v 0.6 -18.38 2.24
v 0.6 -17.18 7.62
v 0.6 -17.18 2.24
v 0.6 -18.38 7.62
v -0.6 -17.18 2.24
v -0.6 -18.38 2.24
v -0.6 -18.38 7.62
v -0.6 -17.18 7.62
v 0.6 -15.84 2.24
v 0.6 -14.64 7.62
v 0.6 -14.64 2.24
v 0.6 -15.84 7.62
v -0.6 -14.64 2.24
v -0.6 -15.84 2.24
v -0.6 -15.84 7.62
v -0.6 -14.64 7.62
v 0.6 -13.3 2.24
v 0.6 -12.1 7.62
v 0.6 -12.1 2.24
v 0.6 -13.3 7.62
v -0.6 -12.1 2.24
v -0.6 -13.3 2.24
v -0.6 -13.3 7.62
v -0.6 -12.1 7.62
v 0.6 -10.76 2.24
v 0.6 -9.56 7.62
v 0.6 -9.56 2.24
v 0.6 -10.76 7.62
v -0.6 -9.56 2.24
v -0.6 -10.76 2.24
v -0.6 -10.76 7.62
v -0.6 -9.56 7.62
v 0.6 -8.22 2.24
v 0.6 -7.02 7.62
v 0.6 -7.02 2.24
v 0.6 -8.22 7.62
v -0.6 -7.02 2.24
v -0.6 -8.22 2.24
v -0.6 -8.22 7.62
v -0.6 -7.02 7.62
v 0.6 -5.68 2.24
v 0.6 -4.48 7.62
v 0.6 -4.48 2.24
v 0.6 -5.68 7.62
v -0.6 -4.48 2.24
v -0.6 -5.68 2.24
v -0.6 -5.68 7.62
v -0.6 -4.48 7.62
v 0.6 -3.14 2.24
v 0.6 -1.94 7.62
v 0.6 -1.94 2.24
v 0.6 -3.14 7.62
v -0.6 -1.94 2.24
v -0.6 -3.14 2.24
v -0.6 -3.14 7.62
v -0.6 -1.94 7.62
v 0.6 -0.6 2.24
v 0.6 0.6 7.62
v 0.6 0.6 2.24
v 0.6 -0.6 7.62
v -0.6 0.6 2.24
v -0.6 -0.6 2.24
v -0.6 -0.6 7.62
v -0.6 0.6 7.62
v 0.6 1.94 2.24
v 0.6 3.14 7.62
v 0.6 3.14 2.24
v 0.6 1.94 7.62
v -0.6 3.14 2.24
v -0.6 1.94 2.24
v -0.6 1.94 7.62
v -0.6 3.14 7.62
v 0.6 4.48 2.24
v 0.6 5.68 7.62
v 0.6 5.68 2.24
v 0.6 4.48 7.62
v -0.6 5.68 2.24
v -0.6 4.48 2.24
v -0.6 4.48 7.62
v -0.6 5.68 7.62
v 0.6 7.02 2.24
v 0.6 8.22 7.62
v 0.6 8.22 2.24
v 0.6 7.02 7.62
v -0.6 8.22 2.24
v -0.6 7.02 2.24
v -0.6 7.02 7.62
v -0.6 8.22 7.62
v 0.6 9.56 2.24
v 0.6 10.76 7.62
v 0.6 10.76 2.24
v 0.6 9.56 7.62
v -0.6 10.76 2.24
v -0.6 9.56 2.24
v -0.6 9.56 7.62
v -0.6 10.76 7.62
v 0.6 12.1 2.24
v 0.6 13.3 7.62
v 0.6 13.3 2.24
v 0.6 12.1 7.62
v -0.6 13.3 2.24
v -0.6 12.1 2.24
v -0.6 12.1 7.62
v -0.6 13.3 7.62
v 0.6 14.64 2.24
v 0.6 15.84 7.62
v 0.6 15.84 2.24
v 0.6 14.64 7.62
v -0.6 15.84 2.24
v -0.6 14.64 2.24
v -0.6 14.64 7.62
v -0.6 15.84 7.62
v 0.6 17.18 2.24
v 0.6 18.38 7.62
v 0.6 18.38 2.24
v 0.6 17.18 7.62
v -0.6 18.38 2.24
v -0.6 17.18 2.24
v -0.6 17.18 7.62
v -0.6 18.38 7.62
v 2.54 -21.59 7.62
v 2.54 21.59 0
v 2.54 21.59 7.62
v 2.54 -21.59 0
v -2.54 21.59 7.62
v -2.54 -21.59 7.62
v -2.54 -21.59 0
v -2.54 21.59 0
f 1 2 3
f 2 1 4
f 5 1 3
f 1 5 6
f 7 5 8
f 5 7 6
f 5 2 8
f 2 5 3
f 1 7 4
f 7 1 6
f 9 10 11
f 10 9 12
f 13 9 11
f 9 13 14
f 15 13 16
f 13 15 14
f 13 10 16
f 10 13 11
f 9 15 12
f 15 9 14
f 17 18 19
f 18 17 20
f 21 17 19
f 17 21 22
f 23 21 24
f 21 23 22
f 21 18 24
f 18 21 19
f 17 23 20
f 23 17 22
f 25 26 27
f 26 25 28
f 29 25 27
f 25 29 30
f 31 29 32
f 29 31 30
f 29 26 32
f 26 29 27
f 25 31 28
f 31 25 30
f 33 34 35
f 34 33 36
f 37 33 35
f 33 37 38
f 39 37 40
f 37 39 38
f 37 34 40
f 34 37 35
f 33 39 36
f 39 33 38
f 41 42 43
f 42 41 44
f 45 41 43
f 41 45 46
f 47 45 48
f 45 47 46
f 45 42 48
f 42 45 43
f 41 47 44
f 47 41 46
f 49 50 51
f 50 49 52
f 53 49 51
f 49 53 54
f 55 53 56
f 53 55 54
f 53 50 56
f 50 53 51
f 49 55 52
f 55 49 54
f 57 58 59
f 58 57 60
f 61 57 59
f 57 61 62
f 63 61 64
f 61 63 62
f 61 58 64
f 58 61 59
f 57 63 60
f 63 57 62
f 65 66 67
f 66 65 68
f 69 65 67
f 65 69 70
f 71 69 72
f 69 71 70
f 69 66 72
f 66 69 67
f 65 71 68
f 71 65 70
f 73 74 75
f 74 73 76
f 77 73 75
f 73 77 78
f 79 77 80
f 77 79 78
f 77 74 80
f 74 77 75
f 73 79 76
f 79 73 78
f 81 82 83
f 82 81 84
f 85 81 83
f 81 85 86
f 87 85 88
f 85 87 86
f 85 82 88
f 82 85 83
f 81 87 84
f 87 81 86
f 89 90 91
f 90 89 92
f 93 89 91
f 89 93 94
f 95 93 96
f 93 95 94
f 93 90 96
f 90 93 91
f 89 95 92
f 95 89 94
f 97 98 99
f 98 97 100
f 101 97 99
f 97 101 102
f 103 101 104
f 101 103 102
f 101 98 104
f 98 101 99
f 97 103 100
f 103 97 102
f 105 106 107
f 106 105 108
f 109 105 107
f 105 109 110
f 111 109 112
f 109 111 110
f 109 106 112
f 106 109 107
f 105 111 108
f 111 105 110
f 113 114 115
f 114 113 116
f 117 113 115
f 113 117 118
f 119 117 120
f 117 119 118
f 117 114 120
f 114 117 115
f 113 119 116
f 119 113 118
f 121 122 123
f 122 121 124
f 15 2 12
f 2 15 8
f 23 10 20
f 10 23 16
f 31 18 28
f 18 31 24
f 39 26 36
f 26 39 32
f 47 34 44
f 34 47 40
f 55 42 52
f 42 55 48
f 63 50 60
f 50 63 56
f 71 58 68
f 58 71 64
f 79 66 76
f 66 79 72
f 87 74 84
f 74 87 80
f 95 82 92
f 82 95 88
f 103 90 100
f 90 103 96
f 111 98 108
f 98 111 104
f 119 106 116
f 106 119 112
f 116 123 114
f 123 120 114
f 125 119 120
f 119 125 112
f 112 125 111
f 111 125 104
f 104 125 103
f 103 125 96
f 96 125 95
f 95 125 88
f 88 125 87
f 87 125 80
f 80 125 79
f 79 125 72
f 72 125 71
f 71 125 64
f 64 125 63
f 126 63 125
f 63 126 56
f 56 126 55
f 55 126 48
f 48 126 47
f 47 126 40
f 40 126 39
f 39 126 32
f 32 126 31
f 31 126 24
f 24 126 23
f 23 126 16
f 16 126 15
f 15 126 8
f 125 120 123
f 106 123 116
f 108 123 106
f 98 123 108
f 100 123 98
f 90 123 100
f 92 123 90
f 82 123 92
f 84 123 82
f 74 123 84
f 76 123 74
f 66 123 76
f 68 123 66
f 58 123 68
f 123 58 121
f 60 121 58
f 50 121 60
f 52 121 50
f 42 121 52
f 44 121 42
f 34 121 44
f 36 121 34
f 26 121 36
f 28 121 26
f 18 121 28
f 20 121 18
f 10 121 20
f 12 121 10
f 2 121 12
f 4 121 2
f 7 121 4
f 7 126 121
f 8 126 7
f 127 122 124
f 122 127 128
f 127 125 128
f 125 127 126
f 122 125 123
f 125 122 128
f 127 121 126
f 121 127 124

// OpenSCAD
spacing = 2.54;
numpins = 15;
pinwidth = 1.2;

length = ( numpins + 2) * spacing;
width = 2 * spacing;
height = 3 * spacing;

x0 = -width / 2;
y0 = -length / 2;

difference()
{
	translate([ x0, y0, 0 ])
	cube([ width, length, height ]);

	// translate([ 0, 0, 10 ])
	for (i = [1:1:numpins])
	{
		translate([ -pinwidth / 2, y0 - pinwidth / 2 + (i + 0.5) * spacing, spacing-0.3 ])
		cube([ pinwidth, pinwidth, 2*spacing + 0.4 ]);
	}
}
